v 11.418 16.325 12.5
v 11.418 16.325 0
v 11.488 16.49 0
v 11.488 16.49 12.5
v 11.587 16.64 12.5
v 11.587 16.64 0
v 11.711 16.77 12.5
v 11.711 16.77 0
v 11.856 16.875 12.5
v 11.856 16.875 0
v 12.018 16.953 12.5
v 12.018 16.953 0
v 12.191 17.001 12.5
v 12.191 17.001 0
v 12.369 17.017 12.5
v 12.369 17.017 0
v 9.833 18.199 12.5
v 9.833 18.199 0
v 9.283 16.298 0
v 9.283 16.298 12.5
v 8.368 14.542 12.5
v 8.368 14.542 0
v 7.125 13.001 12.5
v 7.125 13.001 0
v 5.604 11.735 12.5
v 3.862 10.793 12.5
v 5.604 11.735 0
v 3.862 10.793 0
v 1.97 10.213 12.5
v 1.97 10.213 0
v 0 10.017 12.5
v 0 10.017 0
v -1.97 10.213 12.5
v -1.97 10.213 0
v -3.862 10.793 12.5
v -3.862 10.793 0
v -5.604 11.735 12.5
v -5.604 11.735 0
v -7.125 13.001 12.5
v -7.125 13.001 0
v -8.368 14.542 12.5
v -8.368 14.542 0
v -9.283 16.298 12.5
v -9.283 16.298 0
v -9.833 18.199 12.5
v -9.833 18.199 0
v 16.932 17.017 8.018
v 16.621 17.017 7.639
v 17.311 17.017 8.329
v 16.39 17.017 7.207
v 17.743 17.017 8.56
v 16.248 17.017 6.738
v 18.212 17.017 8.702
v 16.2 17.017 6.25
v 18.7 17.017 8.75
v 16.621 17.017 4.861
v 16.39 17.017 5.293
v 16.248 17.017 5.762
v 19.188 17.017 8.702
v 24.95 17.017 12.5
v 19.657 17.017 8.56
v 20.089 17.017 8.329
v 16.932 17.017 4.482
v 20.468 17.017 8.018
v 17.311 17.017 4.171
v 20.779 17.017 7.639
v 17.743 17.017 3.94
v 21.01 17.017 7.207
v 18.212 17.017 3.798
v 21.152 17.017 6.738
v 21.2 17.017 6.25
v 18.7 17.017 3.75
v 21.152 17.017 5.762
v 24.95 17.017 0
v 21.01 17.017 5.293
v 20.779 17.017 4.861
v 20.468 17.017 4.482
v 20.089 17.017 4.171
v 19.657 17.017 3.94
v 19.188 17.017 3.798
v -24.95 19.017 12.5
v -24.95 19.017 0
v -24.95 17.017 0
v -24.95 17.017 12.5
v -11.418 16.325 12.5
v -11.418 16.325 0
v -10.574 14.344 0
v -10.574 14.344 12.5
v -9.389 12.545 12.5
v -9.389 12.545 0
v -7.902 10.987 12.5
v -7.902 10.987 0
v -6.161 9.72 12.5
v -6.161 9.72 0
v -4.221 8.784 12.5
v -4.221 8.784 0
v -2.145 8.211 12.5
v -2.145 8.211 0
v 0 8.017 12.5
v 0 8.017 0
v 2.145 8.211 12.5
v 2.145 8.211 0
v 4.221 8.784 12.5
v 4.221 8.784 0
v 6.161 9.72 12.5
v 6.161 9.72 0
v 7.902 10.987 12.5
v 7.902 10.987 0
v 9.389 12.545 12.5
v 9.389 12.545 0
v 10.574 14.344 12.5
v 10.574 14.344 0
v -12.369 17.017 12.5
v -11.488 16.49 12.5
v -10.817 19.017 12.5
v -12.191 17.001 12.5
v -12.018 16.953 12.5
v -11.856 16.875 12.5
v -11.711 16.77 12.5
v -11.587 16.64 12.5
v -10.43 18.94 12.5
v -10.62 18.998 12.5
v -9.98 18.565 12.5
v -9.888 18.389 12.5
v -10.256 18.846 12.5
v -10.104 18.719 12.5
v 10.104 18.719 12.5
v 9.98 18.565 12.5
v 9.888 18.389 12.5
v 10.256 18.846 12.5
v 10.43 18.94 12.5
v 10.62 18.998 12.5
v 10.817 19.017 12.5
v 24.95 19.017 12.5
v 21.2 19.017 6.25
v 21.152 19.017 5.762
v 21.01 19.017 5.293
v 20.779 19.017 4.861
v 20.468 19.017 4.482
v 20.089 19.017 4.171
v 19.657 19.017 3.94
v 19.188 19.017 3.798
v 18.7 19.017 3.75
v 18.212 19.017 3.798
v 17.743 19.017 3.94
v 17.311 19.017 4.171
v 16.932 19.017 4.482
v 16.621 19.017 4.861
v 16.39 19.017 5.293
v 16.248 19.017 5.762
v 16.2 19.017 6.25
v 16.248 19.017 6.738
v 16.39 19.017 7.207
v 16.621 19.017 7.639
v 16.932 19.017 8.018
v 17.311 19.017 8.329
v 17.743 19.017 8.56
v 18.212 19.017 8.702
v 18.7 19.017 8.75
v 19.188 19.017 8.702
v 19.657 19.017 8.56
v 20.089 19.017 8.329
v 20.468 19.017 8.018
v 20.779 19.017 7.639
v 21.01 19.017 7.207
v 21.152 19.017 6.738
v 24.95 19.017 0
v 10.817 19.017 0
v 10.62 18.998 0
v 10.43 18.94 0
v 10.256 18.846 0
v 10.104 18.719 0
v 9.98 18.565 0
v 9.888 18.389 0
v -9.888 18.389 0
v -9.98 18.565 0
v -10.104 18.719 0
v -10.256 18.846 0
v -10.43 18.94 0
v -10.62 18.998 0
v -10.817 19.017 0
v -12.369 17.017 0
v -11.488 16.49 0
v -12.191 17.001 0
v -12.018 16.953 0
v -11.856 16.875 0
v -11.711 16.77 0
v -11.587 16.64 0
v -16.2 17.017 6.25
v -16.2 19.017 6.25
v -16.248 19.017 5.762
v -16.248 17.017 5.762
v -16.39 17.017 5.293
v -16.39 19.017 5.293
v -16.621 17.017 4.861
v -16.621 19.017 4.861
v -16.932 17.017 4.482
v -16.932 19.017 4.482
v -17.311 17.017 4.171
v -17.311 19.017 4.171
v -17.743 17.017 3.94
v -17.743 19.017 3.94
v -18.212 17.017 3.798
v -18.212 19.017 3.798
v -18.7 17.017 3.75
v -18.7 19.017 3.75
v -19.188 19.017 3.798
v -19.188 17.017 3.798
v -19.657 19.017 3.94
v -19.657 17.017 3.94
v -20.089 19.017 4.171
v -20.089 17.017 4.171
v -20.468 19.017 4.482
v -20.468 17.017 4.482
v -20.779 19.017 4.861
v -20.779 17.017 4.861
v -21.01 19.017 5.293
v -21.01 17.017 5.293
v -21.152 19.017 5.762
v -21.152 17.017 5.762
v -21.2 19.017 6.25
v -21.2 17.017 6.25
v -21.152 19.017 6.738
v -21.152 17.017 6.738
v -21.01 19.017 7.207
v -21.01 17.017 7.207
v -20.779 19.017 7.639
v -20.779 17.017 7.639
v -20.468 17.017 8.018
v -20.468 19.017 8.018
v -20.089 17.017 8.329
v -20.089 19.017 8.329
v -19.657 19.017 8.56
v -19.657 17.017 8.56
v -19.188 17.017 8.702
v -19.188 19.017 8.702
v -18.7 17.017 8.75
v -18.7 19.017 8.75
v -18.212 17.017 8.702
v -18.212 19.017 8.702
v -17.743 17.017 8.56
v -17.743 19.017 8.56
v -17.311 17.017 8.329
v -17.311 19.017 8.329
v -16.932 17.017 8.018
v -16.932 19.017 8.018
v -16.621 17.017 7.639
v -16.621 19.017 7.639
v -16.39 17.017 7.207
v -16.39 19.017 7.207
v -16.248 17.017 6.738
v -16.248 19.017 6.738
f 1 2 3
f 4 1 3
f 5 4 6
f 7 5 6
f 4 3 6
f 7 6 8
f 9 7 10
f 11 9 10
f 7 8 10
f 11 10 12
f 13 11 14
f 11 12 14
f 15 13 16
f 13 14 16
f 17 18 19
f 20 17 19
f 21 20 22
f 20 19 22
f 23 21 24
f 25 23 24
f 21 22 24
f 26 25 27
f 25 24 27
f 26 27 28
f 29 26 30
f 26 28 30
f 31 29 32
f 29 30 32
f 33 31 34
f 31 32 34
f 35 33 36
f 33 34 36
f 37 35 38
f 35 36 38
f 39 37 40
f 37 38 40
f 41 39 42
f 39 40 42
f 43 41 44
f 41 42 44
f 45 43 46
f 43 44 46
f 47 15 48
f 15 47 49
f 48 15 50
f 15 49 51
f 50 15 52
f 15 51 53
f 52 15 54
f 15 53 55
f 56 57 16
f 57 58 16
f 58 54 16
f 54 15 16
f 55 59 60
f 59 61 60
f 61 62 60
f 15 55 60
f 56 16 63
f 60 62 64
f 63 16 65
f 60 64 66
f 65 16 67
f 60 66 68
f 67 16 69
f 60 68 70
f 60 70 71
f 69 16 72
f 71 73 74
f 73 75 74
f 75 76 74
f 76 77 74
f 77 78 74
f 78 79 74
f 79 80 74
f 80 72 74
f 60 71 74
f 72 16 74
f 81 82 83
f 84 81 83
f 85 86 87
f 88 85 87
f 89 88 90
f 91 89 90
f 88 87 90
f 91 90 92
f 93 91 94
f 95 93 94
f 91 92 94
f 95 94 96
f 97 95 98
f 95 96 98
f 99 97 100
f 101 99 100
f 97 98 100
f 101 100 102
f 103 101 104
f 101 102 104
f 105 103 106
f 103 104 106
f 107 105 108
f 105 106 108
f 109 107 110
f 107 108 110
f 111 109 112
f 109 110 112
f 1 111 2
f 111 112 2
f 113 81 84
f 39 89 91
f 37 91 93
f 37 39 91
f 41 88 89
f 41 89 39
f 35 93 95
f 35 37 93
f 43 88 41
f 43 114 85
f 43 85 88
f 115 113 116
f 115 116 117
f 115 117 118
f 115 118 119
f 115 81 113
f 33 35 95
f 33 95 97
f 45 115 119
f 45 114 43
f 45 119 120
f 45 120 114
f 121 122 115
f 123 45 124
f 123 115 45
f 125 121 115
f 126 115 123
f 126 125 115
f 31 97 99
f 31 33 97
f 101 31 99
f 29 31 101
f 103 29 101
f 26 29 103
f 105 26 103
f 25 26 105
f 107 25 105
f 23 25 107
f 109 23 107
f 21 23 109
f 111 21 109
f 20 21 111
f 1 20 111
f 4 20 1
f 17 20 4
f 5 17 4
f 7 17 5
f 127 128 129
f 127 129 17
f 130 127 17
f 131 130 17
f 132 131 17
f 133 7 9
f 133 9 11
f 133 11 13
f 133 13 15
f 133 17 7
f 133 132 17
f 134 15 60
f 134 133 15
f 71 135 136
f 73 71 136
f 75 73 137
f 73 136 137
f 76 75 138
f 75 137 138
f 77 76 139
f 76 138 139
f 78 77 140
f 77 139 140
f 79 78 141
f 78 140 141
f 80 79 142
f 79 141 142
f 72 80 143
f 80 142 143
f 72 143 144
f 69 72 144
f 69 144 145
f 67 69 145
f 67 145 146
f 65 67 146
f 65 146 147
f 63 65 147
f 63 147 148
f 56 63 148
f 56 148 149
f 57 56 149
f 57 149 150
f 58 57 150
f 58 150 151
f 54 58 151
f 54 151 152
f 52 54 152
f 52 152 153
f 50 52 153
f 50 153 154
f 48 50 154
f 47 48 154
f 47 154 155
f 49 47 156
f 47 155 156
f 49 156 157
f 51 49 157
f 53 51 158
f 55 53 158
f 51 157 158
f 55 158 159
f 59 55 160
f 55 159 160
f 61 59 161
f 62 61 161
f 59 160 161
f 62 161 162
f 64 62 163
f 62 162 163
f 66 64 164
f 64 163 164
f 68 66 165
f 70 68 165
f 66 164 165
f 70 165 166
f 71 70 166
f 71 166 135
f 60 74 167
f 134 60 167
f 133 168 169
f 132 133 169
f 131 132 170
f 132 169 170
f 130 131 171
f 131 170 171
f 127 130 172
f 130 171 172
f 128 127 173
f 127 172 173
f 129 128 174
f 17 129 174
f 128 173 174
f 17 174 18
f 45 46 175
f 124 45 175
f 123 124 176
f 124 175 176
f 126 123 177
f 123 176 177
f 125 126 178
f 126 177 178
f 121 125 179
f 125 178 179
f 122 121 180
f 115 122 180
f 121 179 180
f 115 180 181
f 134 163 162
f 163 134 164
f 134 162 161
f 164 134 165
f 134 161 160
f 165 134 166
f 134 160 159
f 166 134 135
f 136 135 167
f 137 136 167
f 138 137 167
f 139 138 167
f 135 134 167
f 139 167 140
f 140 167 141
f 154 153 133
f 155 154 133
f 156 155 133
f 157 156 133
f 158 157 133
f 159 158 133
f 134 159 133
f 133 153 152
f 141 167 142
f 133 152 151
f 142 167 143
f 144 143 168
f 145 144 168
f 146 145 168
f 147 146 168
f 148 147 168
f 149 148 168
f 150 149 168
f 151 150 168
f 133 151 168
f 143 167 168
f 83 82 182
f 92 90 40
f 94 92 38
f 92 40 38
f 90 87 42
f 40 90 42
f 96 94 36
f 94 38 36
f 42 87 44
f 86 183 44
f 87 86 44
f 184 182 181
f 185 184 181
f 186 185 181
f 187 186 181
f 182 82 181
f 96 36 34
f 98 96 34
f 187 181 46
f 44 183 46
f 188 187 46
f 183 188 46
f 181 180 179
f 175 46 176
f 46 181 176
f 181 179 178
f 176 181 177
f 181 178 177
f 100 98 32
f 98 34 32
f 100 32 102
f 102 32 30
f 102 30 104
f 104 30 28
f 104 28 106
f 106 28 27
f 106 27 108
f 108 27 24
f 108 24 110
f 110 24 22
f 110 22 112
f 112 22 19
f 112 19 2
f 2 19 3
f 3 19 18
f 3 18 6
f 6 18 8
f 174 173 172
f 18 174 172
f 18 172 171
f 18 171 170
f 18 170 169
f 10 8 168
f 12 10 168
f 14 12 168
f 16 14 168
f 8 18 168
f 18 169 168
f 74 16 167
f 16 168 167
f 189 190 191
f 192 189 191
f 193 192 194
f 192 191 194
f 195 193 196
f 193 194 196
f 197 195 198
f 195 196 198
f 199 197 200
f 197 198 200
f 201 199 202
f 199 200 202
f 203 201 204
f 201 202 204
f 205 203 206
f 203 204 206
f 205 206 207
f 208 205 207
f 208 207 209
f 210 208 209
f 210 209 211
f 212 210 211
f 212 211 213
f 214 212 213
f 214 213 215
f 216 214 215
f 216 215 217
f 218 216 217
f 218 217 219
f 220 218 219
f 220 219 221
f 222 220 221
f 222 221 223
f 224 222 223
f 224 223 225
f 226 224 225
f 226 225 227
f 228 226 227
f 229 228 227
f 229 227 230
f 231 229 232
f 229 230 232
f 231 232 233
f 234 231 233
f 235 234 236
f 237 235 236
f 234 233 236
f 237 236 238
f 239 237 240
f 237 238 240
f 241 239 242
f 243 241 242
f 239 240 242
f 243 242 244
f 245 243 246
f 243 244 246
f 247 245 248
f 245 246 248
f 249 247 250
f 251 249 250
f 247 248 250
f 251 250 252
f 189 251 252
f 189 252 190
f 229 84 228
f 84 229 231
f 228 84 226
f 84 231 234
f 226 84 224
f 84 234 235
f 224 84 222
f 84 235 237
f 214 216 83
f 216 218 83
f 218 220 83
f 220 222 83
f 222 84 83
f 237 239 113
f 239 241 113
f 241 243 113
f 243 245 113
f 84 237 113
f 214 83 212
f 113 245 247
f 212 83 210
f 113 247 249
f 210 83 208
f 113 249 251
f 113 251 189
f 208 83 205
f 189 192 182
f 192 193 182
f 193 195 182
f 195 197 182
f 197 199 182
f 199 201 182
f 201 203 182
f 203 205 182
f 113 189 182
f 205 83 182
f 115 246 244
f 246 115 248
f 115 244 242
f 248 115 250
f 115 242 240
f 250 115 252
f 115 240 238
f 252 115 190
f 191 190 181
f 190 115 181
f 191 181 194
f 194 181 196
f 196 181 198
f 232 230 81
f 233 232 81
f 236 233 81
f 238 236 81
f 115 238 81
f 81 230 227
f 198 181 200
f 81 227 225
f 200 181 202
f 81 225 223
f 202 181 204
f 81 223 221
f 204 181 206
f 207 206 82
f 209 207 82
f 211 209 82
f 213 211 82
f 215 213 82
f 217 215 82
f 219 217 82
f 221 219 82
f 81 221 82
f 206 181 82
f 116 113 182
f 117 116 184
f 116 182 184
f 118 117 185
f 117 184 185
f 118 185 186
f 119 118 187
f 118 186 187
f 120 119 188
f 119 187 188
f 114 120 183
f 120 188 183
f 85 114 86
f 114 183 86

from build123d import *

# Parameters (mm, degrees)
BOSS_EXTRUDE2_DEPTH = 12.5
CUT_EXTRUDE1_REACH  = 13
SKETCH4_R           = 2.5


with BuildPart() as part:
    # Sketch3 → Boss-Extrude2 (new body)
    with BuildSketch(Plane.XY):
        with BuildLine():
            Line((-10.816653826, 19.01731952), (-19.949874371, 19.01731952))
            Line((-19.949874371, 19.01731952), (-24.949874371, 19.01731952))
            Line((-24.949874371, 19.01731952), (-24.949874371, 17.01731952))
            Line((-24.949874371, 17.01731952), (-19.949874371, 17.01731952))
            Line((-19.949874371, 17.01731952), (-12.369316877, 17.01731952))
            ThreePointArc((-12.369316877, 17.01731952), (-11.780968471, 16.82592706), (-11.417830963, 16.325011828))
            ThreePointArc((-11.417830963, 16.325011828), (0, 8.01731952), (11.417830963, 16.325011828))
            ThreePointArc((11.417830963, 16.325011828), (11.780968471, 16.82592706), (12.369316877, 17.01731952))
            Line((12.369316877, 17.01731952), (19.949874371, 17.01731952))
            Line((19.949874371, 17.01731952), (24.949874371, 17.01731952))
            Line((24.949874371, 17.01731952), (24.949874371, 19.01731952))
            Line((24.949874371, 19.01731952), (19.949874371, 19.01731952))
            Line((19.949874371, 19.01731952), (10.816653826, 19.01731952))
            ThreePointArc((10.816653826, 19.01731952), (10.177051677, 18.786025635), (9.83332166, 18.199137702))
            ThreePointArc((9.83332166, 18.199137702), (0, 10.01731952), (-9.83332166, 18.199137702))
            ThreePointArc((-9.83332166, 18.199137702), (-10.177051677, 18.786025635), (-10.816653826, 19.01731952))
        make_face()
    extrude(amount=BOSS_EXTRUDE2_DEPTH)

    # Sketch4 → Cut-Extrude1 (cut, up to next)
    with BuildSketch(Plane(origin=(0, 19.01731952, 0), x_dir=(1, 0, 0), z_dir=(0, 1, 0)), mode=Mode.PRIVATE) as cut_extrude1_sk1:
        with Locations((-18.699874371, -6.25)):
            Circle(SKETCH4_R)
    cut_extrude1_tool1 = extrude(cut_extrude1_sk1.sketch, amount=-CUT_EXTRUDE1_REACH, mode=Mode.PRIVATE) & part.part
    add(cut_extrude1_tool1.solids().sort_by_distance((-18.699874, 19.01732, 6.25))[0], mode=Mode.SUBTRACT)
    # Sketch4 → Cut-Extrude1 (cut, up to next)
    with BuildSketch(Plane(origin=(0, 19.01731952, 0), x_dir=(1, 0, 0), z_dir=(0, 1, 0)), mode=Mode.PRIVATE) as cut_extrude1_sk2:
        with Locations((18.699874371, -6.25)):
            Circle(SKETCH4_R)
    cut_extrude1_tool2 = extrude(cut_extrude1_sk2.sketch, amount=-CUT_EXTRUDE1_REACH, mode=Mode.PRIVATE) & part.part
    add(cut_extrude1_tool2.solids().sort_by_distance((18.699874, 19.01732, 6.25))[0], mode=Mode.SUBTRACT)


solid = part.part
